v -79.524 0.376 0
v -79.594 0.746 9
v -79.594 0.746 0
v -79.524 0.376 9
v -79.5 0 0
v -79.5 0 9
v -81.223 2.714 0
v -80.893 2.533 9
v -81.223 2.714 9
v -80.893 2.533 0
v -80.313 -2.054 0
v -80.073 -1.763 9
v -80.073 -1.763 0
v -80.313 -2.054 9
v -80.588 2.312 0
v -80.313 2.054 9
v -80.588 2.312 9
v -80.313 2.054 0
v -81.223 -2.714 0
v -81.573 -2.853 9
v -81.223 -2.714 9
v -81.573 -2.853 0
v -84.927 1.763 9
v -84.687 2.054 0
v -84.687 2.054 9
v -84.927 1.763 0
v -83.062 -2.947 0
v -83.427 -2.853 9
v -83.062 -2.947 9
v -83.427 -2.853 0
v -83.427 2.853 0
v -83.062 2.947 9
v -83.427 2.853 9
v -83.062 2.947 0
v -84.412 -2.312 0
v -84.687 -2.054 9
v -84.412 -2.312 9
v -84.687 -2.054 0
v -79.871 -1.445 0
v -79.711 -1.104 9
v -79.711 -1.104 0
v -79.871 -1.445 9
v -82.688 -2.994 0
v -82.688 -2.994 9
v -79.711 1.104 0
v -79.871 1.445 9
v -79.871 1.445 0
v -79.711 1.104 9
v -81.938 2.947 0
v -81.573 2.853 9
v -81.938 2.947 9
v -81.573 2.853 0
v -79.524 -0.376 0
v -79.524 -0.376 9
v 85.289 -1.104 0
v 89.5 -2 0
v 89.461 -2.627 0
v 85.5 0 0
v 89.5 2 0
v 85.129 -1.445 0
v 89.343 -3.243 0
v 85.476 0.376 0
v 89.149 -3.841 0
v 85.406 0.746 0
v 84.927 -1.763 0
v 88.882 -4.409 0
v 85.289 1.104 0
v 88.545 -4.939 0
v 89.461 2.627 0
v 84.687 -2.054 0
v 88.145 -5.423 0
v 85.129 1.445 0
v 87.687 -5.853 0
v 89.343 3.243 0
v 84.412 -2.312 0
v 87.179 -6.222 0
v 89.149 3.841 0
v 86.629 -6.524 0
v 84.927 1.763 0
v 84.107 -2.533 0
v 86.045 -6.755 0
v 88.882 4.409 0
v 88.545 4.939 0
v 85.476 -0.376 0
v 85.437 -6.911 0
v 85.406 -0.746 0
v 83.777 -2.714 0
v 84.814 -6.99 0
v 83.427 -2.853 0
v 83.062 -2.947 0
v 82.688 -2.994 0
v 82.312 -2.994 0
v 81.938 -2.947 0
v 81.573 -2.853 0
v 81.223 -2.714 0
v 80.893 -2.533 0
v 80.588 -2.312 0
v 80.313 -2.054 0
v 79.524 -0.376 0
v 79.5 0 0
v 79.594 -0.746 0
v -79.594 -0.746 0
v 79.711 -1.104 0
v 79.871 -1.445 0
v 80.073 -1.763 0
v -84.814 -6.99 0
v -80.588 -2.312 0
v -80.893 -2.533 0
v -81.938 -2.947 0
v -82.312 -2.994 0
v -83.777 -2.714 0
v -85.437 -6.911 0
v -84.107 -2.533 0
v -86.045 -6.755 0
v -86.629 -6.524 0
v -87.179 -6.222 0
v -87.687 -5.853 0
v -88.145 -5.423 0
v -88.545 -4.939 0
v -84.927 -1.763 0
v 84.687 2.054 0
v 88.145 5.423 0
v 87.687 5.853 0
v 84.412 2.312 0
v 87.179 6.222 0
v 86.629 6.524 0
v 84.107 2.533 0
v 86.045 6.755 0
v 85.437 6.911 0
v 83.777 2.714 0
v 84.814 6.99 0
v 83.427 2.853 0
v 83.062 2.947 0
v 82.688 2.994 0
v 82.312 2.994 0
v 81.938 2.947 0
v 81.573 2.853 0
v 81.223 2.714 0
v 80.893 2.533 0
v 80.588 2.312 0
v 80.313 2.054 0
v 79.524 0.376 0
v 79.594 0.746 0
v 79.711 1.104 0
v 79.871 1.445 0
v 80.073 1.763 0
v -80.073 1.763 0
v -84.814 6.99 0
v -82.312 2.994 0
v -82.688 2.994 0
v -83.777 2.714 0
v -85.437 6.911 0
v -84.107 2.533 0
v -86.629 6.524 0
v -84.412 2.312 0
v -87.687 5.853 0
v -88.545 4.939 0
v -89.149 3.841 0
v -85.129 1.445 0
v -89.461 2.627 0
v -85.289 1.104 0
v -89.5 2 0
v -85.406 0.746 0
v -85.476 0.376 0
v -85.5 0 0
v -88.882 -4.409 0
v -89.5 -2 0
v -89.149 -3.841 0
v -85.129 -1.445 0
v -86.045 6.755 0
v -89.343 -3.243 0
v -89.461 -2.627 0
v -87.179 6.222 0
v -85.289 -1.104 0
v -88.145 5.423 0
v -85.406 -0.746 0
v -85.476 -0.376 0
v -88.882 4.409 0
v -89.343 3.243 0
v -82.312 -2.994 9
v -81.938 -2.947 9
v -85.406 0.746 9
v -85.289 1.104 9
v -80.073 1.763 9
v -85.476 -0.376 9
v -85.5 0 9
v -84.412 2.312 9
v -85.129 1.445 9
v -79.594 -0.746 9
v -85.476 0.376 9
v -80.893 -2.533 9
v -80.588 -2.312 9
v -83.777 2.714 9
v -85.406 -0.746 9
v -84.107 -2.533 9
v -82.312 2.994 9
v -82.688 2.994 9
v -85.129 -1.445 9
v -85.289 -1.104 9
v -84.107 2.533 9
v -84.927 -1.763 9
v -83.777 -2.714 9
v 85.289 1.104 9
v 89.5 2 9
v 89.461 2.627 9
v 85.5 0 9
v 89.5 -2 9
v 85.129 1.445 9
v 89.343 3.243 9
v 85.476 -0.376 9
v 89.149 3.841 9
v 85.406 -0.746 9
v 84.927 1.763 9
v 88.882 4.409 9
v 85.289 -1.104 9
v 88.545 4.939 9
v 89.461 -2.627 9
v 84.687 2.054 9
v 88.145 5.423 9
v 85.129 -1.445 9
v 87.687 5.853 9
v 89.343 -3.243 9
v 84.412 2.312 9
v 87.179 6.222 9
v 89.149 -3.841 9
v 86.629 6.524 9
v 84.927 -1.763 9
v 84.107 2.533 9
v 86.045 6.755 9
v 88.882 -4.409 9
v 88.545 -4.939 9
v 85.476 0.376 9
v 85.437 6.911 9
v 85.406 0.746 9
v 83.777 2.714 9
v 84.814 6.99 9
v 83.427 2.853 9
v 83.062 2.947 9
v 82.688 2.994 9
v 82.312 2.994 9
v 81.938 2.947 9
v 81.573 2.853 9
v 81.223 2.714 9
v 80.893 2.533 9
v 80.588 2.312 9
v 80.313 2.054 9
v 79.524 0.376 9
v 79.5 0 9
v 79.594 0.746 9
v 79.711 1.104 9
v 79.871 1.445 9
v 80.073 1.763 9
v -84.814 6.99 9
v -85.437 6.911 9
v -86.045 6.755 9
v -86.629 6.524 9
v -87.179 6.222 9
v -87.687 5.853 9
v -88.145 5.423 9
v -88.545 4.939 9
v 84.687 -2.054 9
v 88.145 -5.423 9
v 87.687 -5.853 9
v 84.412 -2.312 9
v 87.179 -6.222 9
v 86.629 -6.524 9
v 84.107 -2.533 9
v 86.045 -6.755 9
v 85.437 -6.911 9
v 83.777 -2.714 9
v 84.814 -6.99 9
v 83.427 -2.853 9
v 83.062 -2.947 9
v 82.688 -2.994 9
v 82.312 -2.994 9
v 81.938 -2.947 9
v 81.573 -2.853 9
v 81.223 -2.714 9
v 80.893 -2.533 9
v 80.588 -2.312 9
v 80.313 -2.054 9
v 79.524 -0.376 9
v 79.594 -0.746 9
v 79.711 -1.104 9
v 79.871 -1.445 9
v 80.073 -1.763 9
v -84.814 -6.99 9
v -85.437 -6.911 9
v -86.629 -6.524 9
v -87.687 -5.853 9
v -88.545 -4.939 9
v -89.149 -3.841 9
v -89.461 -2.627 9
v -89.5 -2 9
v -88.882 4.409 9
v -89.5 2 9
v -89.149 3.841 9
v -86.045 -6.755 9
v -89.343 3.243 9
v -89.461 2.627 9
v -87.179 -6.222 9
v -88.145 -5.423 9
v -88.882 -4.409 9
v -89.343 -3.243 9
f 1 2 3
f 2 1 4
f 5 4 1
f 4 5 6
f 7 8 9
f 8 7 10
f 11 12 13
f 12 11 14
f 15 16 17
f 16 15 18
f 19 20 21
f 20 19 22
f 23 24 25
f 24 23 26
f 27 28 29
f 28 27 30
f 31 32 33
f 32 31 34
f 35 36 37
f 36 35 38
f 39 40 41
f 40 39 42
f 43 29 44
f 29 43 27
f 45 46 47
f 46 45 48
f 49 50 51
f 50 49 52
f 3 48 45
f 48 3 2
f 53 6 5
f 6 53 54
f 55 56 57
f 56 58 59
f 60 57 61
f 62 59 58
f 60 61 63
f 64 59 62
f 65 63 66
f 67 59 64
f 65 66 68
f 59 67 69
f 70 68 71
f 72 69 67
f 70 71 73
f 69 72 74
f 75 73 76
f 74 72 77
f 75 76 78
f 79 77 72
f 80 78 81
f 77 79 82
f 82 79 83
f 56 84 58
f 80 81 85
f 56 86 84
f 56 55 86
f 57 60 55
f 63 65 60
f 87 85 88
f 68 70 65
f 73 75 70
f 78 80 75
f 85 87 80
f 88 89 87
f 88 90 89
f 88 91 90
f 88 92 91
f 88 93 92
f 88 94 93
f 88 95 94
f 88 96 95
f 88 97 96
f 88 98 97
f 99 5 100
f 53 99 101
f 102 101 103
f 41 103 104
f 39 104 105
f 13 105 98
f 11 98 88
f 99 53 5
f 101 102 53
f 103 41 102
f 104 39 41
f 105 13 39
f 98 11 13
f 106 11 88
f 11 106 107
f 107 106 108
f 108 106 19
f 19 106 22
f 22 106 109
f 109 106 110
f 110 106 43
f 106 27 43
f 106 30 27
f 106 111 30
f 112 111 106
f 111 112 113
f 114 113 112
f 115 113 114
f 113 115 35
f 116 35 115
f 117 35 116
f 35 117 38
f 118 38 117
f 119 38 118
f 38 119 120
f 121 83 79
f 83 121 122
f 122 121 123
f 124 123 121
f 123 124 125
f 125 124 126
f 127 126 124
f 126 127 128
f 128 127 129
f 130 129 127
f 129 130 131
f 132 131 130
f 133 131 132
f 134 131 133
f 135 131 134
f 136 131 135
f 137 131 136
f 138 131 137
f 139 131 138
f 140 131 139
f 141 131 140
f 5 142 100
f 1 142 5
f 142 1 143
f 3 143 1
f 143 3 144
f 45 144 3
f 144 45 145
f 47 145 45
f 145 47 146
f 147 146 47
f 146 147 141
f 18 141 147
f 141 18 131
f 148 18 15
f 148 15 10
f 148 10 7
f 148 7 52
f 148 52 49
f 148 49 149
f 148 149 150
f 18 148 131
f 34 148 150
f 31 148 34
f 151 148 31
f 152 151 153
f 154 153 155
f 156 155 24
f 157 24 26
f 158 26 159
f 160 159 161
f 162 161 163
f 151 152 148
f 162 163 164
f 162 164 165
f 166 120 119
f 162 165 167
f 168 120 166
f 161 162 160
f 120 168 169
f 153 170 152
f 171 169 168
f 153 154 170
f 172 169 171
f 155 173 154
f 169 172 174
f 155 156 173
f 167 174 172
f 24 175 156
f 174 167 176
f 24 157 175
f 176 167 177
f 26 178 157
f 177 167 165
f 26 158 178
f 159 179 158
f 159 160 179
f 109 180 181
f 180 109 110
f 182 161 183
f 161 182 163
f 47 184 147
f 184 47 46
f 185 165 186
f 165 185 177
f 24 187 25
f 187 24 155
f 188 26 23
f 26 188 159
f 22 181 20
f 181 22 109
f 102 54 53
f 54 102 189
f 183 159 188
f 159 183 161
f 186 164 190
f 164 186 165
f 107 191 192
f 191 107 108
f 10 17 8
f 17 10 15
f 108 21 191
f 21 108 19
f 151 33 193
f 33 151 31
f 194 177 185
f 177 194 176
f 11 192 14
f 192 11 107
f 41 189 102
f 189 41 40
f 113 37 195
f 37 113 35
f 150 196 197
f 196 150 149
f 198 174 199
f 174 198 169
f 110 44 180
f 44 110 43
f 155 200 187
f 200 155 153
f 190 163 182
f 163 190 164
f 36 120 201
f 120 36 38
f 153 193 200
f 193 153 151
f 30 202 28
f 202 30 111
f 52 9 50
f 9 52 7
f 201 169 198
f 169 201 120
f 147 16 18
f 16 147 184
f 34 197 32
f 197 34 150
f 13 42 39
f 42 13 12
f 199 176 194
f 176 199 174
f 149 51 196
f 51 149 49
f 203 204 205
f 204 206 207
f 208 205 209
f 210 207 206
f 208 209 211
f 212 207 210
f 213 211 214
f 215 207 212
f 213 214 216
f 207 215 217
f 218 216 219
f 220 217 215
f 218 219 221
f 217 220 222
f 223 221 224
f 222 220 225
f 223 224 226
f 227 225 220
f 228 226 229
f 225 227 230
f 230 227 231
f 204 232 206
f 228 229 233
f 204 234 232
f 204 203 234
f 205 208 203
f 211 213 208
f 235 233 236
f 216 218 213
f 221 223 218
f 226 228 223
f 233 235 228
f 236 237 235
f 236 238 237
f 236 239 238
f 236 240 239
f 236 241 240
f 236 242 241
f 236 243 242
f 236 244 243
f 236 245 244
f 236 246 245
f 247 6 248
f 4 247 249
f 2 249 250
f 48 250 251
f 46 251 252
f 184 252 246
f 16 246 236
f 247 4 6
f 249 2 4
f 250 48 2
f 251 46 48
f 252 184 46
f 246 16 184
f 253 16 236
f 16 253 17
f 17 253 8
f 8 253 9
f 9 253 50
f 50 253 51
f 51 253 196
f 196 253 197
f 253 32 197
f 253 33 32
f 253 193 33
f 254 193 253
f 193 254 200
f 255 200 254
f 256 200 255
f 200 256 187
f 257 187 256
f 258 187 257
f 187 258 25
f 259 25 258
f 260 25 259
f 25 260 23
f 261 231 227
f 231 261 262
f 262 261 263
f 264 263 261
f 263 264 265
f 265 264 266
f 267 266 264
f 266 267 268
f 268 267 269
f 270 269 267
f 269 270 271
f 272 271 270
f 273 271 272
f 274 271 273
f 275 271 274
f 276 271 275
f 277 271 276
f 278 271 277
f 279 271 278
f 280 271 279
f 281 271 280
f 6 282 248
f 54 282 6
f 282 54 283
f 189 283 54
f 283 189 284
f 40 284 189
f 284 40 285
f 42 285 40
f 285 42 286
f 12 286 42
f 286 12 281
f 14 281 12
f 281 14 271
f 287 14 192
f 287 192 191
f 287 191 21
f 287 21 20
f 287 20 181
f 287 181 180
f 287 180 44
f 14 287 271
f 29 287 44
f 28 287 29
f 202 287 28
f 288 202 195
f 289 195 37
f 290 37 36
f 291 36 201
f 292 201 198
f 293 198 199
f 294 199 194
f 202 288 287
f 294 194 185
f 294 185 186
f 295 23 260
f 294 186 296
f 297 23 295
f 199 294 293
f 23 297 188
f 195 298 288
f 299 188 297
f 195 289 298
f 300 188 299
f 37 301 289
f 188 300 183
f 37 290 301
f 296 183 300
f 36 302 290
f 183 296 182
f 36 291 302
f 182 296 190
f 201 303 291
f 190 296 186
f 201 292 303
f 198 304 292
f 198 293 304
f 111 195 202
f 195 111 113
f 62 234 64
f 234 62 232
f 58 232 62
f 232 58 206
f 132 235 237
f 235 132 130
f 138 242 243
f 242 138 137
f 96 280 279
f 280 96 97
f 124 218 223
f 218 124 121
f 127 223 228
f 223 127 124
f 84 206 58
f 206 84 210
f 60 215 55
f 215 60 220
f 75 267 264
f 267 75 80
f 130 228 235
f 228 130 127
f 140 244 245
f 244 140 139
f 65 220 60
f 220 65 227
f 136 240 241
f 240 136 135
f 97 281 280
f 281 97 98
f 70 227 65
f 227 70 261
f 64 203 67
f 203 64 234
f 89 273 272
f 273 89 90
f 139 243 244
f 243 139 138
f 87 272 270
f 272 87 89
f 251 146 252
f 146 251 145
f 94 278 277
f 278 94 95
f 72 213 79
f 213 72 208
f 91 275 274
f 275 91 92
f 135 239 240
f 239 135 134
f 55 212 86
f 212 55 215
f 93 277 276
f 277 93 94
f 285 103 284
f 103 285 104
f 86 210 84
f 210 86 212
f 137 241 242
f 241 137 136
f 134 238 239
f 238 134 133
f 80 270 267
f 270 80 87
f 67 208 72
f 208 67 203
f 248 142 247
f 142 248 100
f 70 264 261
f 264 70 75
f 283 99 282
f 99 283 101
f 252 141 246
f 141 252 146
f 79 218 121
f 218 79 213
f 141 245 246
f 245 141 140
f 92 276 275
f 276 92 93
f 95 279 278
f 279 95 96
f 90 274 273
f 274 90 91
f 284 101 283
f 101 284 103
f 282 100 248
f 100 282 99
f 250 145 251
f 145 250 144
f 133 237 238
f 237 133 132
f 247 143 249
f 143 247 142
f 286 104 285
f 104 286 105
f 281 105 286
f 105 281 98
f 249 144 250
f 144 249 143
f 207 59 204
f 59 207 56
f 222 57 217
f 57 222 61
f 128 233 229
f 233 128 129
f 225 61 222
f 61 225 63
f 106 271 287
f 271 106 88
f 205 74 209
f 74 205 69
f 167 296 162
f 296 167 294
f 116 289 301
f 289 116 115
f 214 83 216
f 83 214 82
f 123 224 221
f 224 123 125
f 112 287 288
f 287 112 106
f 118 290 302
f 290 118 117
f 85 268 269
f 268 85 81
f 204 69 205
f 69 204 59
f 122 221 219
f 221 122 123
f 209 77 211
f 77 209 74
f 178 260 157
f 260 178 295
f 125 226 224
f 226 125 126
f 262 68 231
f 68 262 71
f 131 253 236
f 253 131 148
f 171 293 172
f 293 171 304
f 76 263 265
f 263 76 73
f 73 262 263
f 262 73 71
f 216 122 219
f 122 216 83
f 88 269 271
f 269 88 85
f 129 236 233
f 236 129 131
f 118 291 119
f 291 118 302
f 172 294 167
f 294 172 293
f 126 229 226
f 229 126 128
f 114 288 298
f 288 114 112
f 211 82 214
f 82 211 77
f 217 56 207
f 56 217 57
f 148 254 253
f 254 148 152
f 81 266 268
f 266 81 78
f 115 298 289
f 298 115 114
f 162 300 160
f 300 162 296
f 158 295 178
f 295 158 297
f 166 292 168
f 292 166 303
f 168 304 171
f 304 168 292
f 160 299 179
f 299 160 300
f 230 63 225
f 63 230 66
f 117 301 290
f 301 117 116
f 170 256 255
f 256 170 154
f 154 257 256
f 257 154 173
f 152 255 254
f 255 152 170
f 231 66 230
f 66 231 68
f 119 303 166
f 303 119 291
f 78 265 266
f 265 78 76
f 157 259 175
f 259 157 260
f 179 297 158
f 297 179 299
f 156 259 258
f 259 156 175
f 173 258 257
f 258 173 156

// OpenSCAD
$fn = 50;


difference() {
	union() {
		hull() {
			translate(v = [-84.5000000000, 2.0000000000, 0]) {
				cylinder(h = 9, r = 5);
			}
			translate(v = [84.5000000000, 2.0000000000, 0]) {
				cylinder(h = 9, r = 5);
			}
			translate(v = [-84.5000000000, -2.0000000000, 0]) {
				cylinder(h = 9, r = 5);
			}
			translate(v = [84.5000000000, -2.0000000000, 0]) {
				cylinder(h = 9, r = 5);
			}
		}
	}
	union() {
		translate(v = [-82.5000000000, 0.0000000000, 0]) {
			cylinder(h = 9, r = 3.0000000000);
		}
		translate(v = [82.5000000000, 0.0000000000, 0]) {
			cylinder(h = 9, r = 3.0000000000);
		}
		translate(v = [-82.5000000000, 0.0000000000, 0]) {
			cylinder(h = 9, r = 1.5000000000);
		}
		translate(v = [82.5000000000, 0.0000000000, 0]) {
			cylinder(h = 9, r = 1.5000000000);
		}
		translate(v = [-82.5000000000, 0.0000000000, 0]) {
			cylinder(h = 9, r = 1.5000000000);
		}
		translate(v = [82.5000000000, 0.0000000000, 0]) {
			cylinder(h = 9, r = 1.5000000000);
		}
		translate(v = [-82.5000000000, 0.0000000000, 0]) {
			cylinder(h = 9, r = 1.5000000000);
		}
		translate(v = [82.5000000000, 0.0000000000, 0]) {
			cylinder(h = 9, r = 1.5000000000);
		}
	}
}
